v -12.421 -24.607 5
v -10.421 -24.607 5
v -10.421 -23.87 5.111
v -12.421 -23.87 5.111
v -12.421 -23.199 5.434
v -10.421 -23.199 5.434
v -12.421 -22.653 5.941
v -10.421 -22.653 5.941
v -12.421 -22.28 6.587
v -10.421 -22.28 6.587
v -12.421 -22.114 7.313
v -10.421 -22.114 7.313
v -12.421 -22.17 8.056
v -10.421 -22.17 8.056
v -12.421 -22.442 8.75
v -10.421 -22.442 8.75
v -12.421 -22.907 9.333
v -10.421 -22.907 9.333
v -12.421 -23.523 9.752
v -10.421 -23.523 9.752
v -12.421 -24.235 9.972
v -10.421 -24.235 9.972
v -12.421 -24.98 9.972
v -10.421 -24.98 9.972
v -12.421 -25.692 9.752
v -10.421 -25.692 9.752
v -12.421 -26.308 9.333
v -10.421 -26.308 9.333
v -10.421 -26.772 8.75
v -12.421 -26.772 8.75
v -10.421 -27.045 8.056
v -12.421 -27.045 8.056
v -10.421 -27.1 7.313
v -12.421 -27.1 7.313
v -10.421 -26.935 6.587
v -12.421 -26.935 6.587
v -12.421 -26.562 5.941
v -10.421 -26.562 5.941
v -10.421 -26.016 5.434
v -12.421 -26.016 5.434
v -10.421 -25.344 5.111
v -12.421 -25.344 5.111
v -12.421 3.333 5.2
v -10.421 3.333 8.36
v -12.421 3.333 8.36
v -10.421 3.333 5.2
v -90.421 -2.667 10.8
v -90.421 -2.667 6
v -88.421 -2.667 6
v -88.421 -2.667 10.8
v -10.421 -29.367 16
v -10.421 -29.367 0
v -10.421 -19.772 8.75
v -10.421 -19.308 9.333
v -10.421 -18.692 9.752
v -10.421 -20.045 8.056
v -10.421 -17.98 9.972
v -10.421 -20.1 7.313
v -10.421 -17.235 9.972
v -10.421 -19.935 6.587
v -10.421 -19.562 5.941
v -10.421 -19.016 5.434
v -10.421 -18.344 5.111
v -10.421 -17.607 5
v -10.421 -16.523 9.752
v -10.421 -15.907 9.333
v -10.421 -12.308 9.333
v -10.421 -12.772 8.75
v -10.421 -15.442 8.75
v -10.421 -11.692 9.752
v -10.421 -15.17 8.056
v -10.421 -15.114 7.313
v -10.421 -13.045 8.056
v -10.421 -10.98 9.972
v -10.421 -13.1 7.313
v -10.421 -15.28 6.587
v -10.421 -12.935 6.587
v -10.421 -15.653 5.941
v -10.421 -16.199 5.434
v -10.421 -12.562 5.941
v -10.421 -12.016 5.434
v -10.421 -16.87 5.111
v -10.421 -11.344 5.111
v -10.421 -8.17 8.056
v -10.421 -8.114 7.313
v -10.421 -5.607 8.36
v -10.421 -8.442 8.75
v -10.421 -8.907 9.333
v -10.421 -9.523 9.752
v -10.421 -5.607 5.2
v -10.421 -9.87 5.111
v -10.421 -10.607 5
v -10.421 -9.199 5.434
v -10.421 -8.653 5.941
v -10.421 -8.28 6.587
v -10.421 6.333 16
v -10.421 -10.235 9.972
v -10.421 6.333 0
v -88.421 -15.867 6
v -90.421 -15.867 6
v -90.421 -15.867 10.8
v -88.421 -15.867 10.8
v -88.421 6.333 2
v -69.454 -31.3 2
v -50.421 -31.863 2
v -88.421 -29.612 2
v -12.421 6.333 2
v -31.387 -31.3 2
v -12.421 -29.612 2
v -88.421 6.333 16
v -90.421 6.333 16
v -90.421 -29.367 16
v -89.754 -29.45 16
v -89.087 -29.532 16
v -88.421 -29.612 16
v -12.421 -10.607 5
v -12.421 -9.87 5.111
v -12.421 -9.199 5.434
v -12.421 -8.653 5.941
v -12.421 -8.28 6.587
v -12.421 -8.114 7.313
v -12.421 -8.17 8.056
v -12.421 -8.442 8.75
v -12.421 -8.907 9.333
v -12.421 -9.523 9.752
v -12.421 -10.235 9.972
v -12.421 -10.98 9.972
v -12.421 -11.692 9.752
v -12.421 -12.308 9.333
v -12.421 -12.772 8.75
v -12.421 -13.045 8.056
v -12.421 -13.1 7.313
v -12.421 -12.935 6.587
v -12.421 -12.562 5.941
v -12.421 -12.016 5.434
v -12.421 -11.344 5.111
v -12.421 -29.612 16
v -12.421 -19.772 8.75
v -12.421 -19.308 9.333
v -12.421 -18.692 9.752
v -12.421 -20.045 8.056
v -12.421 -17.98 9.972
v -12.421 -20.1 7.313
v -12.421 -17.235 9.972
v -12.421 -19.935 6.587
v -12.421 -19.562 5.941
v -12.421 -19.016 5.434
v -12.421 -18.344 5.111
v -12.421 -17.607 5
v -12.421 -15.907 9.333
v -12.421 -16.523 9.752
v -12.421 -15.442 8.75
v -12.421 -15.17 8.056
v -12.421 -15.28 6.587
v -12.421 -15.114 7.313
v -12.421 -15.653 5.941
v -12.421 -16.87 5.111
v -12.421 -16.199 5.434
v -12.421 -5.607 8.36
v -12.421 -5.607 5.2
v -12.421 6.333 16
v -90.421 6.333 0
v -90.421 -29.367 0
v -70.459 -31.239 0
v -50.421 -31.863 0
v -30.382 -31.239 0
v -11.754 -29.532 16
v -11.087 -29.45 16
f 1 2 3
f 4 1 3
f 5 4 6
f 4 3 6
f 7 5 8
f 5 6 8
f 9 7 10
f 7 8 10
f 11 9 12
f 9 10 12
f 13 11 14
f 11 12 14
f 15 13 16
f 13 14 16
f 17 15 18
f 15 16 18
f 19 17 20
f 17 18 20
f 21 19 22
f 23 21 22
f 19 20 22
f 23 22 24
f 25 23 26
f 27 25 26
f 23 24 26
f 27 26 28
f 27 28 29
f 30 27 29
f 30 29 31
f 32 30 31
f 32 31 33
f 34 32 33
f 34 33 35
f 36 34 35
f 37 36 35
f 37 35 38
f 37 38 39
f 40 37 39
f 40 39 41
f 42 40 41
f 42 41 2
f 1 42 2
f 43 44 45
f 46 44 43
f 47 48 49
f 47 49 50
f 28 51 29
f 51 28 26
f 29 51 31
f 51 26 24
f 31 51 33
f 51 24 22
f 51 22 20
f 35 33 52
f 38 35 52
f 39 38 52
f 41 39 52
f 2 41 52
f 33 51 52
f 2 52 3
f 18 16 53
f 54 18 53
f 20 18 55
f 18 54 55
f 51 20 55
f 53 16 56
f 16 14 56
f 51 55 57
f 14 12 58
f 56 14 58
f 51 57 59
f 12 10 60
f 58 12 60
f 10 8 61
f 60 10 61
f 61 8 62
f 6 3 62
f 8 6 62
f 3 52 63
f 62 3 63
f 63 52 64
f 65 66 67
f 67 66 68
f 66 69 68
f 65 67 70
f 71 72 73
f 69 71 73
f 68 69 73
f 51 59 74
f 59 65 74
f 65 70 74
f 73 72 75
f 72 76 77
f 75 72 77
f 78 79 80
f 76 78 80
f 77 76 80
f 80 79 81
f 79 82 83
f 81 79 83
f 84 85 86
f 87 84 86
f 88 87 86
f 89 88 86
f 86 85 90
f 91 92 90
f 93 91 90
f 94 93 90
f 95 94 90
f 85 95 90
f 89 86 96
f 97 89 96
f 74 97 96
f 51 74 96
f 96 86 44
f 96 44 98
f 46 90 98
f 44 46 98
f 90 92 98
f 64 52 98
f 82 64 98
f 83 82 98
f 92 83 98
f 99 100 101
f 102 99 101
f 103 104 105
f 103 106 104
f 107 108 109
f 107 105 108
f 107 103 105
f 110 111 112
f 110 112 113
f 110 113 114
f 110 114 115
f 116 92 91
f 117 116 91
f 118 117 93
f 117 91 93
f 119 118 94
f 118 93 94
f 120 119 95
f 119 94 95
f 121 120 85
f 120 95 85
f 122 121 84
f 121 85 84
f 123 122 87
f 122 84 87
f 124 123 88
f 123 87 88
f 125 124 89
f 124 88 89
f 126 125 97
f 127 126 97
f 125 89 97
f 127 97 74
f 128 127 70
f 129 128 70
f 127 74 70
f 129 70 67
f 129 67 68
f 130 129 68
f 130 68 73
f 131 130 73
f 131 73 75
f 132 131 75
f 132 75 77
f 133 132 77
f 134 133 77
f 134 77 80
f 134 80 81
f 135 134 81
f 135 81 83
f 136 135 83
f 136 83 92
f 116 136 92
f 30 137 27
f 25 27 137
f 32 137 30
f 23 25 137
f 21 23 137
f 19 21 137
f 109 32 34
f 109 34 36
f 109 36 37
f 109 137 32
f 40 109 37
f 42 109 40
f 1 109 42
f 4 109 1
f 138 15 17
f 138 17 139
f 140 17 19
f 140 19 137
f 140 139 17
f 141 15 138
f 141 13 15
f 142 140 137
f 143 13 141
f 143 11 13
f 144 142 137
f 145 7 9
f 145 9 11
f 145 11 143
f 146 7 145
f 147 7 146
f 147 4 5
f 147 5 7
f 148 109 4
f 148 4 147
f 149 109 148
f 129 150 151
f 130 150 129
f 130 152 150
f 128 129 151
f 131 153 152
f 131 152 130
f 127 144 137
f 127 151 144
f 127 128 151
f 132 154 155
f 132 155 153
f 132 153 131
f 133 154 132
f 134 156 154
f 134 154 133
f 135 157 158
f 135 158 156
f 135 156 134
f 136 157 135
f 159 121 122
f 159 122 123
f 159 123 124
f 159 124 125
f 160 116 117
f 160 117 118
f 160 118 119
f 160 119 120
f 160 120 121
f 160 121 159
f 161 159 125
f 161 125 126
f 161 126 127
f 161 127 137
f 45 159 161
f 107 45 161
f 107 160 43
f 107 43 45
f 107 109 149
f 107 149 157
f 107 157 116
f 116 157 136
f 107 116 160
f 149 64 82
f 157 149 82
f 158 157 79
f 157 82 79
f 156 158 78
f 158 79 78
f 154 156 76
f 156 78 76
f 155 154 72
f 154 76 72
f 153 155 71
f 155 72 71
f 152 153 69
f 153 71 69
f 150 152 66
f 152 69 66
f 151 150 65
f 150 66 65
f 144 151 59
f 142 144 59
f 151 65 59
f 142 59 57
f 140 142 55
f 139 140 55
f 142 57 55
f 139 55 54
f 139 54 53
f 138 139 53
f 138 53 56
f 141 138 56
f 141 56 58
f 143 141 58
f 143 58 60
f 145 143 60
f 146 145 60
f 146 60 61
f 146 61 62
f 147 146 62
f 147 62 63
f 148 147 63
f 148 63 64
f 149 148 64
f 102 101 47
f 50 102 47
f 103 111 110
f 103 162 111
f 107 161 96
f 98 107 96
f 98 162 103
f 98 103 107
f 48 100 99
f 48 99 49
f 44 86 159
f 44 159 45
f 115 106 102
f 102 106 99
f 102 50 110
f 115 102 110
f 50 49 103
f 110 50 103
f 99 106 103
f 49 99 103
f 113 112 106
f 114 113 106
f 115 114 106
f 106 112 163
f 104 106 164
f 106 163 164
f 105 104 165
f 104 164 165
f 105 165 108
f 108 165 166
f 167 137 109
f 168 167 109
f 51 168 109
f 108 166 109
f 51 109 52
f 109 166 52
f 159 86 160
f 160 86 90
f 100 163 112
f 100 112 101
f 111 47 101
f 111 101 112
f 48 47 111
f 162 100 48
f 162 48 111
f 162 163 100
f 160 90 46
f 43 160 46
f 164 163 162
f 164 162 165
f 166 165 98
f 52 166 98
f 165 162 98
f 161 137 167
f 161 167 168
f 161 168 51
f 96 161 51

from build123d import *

# Parameters (mm, degrees)
SKETCH_1_W          = 80
SKETCH_1_H          = 35.7
EXTRUDE_1_DEPTH     = 16
SHELL_1_T           = -2
CUT_EXTRUDE_3_REACH = 89.586
SKETCH_2_W          = 4.8
SKETCH_2_H          = 13.2
CUT_EXTRUDE_4_REACH = 89.586
SKETCH_6_R          = 2.5
SKETCH_6_W          = 3.16
SKETCH_6_H          = 8.94


with BuildPart() as part:
    # 草图1 → 凸台-拉伸1 (new body)
    with BuildSketch(Plane.XY):
        with Locations((-50.420566467, -11.517328482)):
            Rectangle(SKETCH_1_W, SKETCH_1_H)
        with BuildLine():
            Line((-10.420566467, -29.367328482), (-90.420566467, -29.367328482))
            ThreePointArc((-90.420566467, -29.367328482), (-50.420566467, -31.863413079), (-10.420566467, -29.367328482))
        make_face()
    extrude(amount=EXTRUDE_1_DEPTH)

    # 抽壳1
    shell_1_openings = [part.faces().sort_by_distance(p)[0] for p in [
        (-50.420566467, -12.357406874, 16),
        (-50.420566467, 6.332671518, 8),
        (-50.420566467, -31.863413079, 8),
    ]]
    offset(amount=SHELL_1_T, openings=shell_1_openings, kind=Kind.INTERSECTION)

    # 草图2 → 切除-拉伸3 (cut, up to next)
    with BuildSketch(Plane.ZY.offset(90.420566467), mode=Mode.PRIVATE) as cut_extrude_3_sk1:
        with Locations((8.4, -9.267328482)):
            Rectangle(SKETCH_2_W, SKETCH_2_H)
    cut_extrude_3_tool1 = extrude(cut_extrude_3_sk1.sketch, amount=-CUT_EXTRUDE_3_REACH, mode=Mode.PRIVATE) & part.part
    add(cut_extrude_3_tool1.solids().sort_by_distance((-90.420566, -9.267328, 8.4))[0], mode=Mode.SUBTRACT)

    # 草图6 → 切除-拉伸4 (cut, up to next)
    with BuildSketch(Plane(origin=(-10.420566467, 0, 0), x_dir=(0, 0, -1), z_dir=(1, 0, 0)), mode=Mode.PRIVATE) as cut_extrude_4_sk1:
        with Locations((-7.5, -10.607328482)):
            Circle(SKETCH_6_R)
    cut_extrude_4_tool1 = extrude(cut_extrude_4_sk1.sketch, amount=-CUT_EXTRUDE_4_REACH, mode=Mode.PRIVATE) & part.part
    # 草图6 → 切除-拉伸4 (cut, up to next)
    with BuildSketch(Plane(origin=(-10.420566467, 0, 0), x_dir=(0, 0, -1), z_dir=(1, 0, 0)), mode=Mode.PRIVATE) as cut_extrude_4_sk2:
        with Locations((-7.5, -17.607328482)):
            Circle(SKETCH_6_R)
    cut_extrude_4_tool2 = extrude(cut_extrude_4_sk2.sketch, amount=-CUT_EXTRUDE_4_REACH, mode=Mode.PRIVATE) & part.part
    # 草图6 → 切除-拉伸4 (cut, up to next)
    with BuildSketch(Plane(origin=(-10.420566467, 0, 0), x_dir=(0, 0, -1), z_dir=(1, 0, 0)), mode=Mode.PRIVATE) as cut_extrude_4_sk3:
        with Locations((-7.5, -24.607328482)):
            Circle(SKETCH_6_R)
    cut_extrude_4_tool3 = extrude(cut_extrude_4_sk3.sketch, amount=-CUT_EXTRUDE_4_REACH, mode=Mode.PRIVATE) & part.part
    # 草图6 → 切除-拉伸4 (cut, up to next)
    with BuildSketch(Plane(origin=(-10.420566467, 0, 0), x_dir=(0, 0, -1), z_dir=(1, 0, 0)), mode=Mode.PRIVATE) as cut_extrude_4_sk4:
        with Locations((-6.78, -1.137328482)):
            Rectangle(SKETCH_6_W, SKETCH_6_H)
    cut_extrude_4_tool4 = extrude(cut_extrude_4_sk4.sketch, amount=-CUT_EXTRUDE_4_REACH, mode=Mode.PRIVATE) & part.part
    add(cut_extrude_4_tool1.solids().sort_by_distance((-10.420566, -10.607328, 7.5))[0], mode=Mode.SUBTRACT)
    add(cut_extrude_4_tool2.solids().sort_by_distance((-10.420566, -17.607328, 7.5))[0], mode=Mode.SUBTRACT)
    add(cut_extrude_4_tool3.solids().sort_by_distance((-10.420566, -24.607328, 7.5))[0], mode=Mode.SUBTRACT)
    add(cut_extrude_4_tool4.solids().sort_by_distance((-10.420566, -1.137328, 6.78))[0], mode=Mode.SUBTRACT)


solid = part.part
